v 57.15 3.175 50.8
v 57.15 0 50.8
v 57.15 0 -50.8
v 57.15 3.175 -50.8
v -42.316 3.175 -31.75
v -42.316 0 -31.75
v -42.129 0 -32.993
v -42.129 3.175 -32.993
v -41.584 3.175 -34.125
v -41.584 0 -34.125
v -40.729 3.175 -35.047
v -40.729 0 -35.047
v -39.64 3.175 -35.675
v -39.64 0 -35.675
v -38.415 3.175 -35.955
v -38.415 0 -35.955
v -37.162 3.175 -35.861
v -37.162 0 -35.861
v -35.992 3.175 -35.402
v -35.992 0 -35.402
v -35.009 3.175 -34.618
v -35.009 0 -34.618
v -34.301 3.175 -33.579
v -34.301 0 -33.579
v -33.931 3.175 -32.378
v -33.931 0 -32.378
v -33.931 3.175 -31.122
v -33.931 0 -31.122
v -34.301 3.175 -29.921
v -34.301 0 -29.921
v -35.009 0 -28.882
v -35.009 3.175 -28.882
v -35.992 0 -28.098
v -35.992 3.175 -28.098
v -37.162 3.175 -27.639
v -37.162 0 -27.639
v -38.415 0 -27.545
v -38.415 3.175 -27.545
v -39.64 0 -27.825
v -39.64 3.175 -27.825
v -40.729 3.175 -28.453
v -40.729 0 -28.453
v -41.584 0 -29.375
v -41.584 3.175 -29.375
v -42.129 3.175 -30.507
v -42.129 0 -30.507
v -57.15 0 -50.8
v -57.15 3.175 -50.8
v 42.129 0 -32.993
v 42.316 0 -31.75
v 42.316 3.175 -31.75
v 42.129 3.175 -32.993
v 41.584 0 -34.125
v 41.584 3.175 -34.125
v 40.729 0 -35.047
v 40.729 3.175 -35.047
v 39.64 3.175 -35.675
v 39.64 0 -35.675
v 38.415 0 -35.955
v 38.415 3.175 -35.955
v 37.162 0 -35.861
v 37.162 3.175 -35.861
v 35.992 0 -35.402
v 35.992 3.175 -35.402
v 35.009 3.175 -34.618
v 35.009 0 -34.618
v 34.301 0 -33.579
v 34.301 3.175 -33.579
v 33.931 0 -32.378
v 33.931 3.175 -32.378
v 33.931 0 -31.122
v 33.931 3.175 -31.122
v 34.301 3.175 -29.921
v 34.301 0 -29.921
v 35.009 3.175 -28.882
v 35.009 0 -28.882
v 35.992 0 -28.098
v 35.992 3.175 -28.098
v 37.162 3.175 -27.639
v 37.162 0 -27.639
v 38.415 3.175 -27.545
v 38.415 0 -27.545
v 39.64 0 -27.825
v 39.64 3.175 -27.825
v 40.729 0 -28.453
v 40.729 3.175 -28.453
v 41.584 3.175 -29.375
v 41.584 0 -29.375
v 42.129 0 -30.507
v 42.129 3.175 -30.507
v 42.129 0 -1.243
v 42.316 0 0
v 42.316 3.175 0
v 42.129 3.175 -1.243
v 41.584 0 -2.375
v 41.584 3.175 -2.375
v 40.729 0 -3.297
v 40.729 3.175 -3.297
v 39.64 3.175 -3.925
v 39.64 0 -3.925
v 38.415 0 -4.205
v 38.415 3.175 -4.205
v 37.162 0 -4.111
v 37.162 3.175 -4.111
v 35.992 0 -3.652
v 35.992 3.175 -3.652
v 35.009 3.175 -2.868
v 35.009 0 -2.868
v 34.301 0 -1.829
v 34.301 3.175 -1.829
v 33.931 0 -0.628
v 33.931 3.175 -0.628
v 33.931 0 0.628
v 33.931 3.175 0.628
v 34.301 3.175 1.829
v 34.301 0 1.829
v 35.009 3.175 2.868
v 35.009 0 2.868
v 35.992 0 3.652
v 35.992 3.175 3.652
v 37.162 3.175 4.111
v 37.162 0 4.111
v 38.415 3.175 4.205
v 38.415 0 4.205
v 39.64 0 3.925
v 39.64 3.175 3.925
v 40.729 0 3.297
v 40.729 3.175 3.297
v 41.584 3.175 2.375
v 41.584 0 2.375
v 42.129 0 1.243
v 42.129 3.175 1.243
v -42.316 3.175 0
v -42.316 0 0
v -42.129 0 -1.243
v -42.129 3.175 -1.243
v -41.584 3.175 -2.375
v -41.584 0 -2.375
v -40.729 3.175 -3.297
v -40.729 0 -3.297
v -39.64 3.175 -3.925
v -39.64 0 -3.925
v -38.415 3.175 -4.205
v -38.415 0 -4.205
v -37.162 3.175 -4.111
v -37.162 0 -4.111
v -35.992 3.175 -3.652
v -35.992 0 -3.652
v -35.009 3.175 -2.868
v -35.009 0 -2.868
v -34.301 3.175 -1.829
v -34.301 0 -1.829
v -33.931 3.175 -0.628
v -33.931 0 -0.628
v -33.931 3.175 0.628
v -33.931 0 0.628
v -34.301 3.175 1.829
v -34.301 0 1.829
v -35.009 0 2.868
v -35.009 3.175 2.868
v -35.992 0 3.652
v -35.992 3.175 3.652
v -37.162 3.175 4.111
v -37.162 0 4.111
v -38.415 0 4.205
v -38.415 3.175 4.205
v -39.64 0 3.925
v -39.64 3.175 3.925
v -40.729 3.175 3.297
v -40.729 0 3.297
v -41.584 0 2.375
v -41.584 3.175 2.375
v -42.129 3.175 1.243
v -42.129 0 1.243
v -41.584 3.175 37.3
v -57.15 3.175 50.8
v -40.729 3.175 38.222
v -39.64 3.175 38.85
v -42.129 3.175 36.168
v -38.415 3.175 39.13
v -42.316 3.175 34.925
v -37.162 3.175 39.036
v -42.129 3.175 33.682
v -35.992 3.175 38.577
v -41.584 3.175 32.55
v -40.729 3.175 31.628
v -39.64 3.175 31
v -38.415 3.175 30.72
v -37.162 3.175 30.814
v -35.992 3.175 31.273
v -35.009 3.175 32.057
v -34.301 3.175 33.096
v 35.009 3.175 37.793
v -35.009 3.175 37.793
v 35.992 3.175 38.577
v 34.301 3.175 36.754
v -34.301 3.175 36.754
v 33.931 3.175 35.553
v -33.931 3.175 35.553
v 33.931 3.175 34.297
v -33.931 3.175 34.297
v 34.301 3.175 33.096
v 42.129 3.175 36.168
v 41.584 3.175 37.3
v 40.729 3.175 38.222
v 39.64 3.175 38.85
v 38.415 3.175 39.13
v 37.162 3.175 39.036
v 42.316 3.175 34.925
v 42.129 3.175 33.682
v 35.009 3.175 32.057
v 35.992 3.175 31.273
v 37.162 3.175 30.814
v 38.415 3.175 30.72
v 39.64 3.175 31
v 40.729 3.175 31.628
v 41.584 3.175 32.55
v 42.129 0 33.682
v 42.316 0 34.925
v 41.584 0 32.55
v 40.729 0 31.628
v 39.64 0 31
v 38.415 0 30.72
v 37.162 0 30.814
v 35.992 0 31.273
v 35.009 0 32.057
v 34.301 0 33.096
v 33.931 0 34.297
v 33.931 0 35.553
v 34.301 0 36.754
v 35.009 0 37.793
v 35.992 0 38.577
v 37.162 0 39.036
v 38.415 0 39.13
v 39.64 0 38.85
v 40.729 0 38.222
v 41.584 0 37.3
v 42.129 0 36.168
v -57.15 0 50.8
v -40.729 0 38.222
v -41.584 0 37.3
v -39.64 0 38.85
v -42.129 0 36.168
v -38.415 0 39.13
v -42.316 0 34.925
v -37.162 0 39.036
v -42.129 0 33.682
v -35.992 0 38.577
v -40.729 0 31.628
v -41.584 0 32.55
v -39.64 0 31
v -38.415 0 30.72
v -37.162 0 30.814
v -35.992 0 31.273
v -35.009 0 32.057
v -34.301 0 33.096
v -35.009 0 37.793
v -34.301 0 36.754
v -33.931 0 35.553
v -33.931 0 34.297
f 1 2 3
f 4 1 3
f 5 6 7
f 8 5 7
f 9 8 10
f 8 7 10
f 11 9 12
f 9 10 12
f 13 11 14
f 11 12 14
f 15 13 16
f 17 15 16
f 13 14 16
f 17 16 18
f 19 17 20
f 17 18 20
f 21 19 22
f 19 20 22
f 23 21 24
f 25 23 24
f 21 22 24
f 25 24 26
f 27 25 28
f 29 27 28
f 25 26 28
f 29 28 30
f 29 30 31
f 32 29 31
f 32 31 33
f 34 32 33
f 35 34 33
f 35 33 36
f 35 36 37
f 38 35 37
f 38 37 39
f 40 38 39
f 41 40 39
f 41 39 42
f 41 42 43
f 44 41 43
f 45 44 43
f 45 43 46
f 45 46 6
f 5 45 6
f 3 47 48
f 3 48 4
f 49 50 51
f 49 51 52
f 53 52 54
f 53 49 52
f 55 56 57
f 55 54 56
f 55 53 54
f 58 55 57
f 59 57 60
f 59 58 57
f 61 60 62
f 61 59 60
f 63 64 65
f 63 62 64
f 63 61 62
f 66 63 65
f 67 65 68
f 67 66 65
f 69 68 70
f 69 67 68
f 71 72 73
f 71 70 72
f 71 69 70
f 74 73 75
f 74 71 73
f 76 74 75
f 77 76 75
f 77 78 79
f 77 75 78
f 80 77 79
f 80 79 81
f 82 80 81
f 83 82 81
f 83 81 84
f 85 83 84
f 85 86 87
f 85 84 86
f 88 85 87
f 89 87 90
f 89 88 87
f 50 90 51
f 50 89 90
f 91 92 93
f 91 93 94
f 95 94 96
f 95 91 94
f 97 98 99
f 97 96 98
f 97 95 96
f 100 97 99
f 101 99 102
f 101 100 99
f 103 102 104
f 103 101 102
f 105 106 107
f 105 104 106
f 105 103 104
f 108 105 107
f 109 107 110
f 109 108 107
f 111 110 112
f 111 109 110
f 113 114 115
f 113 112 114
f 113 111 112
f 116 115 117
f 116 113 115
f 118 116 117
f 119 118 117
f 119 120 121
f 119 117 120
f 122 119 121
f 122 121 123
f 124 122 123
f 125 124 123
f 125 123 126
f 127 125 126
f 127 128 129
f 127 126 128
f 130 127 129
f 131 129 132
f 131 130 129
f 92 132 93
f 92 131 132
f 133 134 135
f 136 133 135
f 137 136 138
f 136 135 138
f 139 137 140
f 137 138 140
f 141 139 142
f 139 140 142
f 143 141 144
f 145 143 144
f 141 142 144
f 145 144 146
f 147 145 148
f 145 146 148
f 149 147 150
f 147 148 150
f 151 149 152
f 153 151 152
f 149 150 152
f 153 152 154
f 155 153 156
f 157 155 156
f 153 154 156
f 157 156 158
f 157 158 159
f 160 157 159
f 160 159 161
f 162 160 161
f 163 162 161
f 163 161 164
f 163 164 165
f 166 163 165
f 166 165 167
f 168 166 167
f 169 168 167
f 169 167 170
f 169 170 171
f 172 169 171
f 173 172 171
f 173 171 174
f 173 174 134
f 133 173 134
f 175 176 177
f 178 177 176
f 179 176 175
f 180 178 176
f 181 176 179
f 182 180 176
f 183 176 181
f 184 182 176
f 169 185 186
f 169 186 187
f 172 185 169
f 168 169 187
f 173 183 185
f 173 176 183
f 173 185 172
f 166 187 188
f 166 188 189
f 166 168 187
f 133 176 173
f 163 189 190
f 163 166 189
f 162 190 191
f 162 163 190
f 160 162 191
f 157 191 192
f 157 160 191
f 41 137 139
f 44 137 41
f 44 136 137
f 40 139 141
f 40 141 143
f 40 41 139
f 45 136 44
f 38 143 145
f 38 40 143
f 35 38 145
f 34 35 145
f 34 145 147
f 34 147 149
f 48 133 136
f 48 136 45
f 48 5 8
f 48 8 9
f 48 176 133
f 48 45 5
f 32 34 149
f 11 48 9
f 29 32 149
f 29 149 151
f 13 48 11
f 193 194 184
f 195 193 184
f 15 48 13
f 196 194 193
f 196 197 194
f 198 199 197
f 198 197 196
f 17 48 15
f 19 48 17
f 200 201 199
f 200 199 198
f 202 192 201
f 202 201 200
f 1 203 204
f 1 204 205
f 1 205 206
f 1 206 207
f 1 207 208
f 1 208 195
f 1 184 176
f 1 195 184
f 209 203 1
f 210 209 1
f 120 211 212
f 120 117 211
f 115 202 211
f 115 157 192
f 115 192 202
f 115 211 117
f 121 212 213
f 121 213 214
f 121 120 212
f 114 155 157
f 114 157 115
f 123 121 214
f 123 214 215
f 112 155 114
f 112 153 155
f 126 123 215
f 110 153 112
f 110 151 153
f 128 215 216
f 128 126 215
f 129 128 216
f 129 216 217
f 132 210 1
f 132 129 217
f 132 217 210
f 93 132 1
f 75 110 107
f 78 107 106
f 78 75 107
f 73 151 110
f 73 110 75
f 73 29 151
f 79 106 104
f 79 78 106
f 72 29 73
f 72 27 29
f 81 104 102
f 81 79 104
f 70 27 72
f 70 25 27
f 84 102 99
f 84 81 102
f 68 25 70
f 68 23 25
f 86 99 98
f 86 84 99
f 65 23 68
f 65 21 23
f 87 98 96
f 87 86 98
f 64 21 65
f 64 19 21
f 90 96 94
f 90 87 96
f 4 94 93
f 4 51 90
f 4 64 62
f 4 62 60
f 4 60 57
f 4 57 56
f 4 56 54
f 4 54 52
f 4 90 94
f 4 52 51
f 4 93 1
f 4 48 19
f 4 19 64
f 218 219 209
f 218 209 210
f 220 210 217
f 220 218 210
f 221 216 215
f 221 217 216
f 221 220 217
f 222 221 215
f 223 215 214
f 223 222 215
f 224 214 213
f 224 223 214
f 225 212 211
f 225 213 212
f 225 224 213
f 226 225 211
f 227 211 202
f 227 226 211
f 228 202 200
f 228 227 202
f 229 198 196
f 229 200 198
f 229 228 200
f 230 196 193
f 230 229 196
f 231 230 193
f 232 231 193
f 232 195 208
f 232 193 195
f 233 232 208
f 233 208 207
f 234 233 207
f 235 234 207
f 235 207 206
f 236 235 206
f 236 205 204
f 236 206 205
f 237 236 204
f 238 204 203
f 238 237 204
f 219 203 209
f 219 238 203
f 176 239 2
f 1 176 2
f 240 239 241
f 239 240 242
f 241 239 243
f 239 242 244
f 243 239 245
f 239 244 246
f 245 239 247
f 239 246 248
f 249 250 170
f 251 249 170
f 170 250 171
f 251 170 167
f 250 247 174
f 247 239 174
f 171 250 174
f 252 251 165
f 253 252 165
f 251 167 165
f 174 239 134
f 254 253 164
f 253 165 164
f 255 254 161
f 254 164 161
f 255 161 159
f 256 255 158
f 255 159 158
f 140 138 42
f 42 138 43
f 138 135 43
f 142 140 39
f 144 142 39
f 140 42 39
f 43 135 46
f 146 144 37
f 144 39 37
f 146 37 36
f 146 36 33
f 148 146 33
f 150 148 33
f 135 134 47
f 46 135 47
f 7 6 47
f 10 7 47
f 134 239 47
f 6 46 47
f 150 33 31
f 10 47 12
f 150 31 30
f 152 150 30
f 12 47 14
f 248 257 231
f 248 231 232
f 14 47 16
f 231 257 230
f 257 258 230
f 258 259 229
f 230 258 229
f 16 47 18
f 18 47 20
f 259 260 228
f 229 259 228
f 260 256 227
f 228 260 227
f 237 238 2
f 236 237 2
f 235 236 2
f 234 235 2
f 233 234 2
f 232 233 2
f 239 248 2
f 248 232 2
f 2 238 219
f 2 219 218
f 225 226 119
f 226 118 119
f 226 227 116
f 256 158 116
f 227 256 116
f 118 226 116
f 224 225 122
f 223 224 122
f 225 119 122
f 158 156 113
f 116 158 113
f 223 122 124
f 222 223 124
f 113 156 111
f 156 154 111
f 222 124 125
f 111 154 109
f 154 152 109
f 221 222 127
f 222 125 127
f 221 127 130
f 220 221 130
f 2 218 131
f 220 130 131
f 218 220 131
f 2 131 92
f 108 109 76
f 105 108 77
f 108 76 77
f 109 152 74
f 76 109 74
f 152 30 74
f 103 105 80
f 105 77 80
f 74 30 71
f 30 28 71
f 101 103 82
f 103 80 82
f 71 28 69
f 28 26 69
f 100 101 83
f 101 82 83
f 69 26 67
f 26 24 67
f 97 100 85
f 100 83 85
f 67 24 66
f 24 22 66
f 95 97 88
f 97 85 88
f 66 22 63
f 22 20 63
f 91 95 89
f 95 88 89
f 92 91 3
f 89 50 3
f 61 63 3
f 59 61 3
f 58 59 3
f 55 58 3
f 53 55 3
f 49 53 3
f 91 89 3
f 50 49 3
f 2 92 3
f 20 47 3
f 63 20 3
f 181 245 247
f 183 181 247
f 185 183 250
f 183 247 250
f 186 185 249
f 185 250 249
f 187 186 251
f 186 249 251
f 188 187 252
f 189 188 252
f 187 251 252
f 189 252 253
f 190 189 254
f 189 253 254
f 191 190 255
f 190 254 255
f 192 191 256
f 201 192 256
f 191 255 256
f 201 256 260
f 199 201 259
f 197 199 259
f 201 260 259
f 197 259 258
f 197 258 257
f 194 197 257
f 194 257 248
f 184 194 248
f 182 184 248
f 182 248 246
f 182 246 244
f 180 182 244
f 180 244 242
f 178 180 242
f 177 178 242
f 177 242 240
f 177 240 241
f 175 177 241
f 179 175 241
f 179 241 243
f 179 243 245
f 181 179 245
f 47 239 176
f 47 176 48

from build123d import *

# Parameters (mm, degrees)
SKETCH1_W                = 114.3
SKETCH1_H                = 101.6
BOSS_EXTRUDE1_DEPTH      = 3.175
F_5_16_CLEARANCE_HOLE2_D = 8.4328


with BuildPart() as part:
    # Sketch1 → Boss-Extrude1 (new body)
    with BuildSketch(Plane(origin=(0, 0, 0), x_dir=(1, 0, 0), z_dir=(0, 1, 0))):
        Rectangle(SKETCH1_W, SKETCH1_H)
    extrude(amount=BOSS_EXTRUDE1_DEPTH)

    # 5/16 Clearance Hole2 (through all)
    with Locations(Plane(origin=(0, 3.175, 0), x_dir=(1, 0, 0), z_dir=(0, 1, 0))):
        with Locations((-38.1, 31.75), (-38.1, 0), (-38.1, -34.925)):
            f_5_16_clearance_hole2 = Hole(F_5_16_CLEARANCE_HOLE2_D / 2)

    # Mirror2: 5/16 Clearance Hole2 across plane
    add(f_5_16_clearance_hole2.mirror(Plane(origin=(0, 0, 0), x_dir=(0, 0, 1), z_dir=(1, 0, 0))), mode=Mode.SUBTRACT)


solid = part.part
